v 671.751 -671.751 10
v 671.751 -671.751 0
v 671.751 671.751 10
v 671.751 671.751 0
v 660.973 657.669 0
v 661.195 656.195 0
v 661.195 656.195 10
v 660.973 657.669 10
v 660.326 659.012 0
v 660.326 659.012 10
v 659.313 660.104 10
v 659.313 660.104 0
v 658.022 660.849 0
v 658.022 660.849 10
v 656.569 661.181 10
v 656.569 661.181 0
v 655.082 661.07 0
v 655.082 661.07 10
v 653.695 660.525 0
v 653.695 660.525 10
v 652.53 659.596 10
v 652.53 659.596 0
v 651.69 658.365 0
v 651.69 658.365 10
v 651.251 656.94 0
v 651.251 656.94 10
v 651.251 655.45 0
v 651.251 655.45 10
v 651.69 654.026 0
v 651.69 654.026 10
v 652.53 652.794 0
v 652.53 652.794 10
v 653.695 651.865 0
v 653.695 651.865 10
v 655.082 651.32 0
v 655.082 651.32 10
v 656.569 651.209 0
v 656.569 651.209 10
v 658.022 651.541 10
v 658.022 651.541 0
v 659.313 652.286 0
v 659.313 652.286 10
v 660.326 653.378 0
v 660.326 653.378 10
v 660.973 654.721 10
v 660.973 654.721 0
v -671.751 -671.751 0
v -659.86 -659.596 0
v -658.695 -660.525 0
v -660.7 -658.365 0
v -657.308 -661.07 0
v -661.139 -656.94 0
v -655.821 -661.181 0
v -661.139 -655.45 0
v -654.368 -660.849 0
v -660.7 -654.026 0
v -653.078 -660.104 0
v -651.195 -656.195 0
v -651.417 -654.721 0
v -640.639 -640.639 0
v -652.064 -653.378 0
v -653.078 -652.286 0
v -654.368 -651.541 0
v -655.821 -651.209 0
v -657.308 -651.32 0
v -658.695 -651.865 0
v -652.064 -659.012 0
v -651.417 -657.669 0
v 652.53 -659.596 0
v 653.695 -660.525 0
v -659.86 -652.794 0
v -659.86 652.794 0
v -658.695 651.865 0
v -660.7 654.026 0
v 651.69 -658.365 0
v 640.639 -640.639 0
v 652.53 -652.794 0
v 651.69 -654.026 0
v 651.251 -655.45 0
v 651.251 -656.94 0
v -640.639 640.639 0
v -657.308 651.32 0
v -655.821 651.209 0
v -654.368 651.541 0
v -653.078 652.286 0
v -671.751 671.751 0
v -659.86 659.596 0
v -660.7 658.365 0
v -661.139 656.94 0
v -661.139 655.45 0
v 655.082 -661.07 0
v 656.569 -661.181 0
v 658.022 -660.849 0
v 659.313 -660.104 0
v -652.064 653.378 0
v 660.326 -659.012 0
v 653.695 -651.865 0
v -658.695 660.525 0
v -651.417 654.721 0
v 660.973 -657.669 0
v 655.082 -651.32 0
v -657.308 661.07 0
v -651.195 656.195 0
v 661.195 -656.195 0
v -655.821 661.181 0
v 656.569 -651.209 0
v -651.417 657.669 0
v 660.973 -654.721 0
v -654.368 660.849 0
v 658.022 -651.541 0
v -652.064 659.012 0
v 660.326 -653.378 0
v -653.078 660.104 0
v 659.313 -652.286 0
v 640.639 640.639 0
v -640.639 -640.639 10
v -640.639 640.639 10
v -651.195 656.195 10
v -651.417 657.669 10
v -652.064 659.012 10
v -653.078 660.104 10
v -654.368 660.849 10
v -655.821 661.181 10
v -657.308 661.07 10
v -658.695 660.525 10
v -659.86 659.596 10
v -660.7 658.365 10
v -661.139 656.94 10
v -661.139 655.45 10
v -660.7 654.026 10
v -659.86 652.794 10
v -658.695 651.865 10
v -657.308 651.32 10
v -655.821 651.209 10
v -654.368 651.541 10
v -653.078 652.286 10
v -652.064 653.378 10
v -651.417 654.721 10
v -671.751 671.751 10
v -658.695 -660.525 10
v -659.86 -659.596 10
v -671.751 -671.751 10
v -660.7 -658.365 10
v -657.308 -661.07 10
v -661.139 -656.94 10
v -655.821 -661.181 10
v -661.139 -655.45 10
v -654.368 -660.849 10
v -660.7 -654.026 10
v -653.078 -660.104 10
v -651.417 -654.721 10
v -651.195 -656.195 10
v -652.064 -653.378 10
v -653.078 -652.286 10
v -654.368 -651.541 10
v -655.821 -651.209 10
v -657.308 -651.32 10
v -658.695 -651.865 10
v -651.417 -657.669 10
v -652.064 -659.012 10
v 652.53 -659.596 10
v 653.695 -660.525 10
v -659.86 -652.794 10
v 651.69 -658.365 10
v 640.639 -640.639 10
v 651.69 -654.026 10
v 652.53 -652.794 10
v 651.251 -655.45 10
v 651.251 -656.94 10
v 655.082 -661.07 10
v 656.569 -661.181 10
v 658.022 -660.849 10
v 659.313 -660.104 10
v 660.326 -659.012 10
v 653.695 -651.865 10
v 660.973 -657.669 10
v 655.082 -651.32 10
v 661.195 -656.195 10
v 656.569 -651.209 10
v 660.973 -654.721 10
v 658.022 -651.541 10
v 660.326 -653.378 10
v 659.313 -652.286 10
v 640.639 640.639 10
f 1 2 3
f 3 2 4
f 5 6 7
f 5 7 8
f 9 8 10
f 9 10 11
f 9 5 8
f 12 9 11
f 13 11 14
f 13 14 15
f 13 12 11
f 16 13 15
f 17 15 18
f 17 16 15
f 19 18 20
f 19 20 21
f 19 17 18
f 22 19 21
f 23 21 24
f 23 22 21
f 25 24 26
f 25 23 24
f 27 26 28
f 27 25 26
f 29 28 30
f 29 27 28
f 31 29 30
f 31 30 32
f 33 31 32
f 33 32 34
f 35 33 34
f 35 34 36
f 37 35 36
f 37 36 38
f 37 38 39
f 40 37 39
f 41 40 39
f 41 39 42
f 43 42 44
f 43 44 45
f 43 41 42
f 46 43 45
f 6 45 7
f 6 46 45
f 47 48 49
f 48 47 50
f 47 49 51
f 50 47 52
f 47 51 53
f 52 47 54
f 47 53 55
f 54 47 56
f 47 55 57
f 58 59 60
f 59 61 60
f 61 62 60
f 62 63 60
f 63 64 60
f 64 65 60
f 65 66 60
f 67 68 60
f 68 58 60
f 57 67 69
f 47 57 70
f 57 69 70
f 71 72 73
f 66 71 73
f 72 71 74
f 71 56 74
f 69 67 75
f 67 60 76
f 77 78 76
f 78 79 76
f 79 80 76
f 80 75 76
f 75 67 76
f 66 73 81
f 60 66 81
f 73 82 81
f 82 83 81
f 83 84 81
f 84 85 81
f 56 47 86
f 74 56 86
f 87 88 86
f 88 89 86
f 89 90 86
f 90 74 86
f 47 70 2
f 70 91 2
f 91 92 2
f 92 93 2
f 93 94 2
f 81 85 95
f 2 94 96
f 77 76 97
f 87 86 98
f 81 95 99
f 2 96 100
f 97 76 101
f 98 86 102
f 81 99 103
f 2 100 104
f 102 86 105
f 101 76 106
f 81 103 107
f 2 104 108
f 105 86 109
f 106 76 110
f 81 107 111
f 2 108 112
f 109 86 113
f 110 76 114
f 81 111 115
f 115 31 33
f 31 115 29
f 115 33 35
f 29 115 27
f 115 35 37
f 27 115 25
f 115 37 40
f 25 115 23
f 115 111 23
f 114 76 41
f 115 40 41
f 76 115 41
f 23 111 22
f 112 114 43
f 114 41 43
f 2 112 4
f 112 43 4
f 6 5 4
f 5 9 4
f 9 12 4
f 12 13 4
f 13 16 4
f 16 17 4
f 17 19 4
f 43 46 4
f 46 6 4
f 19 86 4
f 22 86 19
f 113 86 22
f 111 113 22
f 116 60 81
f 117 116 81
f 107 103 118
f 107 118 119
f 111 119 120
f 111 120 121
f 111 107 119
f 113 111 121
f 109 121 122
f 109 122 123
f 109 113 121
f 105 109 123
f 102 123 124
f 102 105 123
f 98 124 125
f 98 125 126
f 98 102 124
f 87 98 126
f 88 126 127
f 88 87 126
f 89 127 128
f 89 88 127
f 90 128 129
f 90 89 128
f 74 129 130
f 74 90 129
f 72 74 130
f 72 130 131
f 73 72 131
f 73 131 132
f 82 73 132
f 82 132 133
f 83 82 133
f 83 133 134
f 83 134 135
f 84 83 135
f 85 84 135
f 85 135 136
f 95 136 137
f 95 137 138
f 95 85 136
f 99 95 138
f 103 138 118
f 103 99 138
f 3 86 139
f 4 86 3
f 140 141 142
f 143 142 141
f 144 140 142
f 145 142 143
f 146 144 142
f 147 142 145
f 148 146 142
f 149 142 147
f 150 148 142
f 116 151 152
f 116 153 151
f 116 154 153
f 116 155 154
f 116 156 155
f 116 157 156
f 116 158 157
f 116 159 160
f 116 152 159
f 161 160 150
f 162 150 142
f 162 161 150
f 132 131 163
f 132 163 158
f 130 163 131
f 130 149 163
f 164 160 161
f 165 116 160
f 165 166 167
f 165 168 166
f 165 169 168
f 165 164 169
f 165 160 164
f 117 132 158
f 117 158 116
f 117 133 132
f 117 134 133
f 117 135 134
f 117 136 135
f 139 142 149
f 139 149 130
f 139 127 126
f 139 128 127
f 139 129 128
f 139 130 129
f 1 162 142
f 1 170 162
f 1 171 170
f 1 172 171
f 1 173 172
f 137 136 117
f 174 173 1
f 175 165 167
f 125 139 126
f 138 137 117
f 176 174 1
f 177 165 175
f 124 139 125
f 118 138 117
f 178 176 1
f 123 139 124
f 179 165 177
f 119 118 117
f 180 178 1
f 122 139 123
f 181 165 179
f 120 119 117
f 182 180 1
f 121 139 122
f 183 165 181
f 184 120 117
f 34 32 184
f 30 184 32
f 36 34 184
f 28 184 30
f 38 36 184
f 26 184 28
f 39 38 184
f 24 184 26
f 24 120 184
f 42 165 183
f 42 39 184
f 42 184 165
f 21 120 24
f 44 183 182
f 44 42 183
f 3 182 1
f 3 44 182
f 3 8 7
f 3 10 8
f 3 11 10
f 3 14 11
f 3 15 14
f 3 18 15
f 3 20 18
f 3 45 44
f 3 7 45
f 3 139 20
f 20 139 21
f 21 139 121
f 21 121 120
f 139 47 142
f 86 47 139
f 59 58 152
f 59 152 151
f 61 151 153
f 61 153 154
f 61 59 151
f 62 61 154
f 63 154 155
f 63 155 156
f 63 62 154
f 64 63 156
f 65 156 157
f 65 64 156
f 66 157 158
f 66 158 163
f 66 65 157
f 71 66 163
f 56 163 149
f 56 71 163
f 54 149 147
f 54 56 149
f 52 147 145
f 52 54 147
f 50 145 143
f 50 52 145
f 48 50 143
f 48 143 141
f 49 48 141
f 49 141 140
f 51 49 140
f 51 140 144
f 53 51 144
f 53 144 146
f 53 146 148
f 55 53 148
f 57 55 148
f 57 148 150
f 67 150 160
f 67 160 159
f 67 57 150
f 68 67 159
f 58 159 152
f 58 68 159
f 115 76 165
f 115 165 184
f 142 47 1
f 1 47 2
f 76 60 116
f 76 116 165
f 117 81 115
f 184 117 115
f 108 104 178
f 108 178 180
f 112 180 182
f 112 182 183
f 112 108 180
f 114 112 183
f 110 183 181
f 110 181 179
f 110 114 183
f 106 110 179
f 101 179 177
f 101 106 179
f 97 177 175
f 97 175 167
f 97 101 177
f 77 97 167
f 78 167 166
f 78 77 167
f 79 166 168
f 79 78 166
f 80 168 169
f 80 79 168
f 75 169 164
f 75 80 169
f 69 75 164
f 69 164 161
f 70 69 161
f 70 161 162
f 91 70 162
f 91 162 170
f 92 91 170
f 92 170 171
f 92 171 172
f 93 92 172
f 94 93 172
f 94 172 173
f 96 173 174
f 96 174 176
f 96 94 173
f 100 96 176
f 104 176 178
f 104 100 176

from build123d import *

# Parameters (mm, degrees)
SKETCH1_W           = 1343.502884254
SKETCH1_H           = 1343.502884254
SKETCH1_R           = 5
SKETCH1_W_2         = 1281.27748751
SKETCH1_H_2         = 1281.27748751
BOSS_EXTRUDE1_DEPTH = 10


with BuildPart() as part:
    # Sketch1 → Boss-Extrude1 (new body)
    with BuildSketch(Plane.XY):
        Rectangle(SKETCH1_W, SKETCH1_H)
        with Locations((-656.195092941, 656.195092941)):
            Circle(SKETCH1_R, mode=Mode.SUBTRACT)
        with Locations((656.195092941, 656.195092941)):
            Circle(SKETCH1_R, mode=Mode.SUBTRACT)
        with Locations((656.195092941, -656.195092941)):
            Circle(SKETCH1_R, mode=Mode.SUBTRACT)
        with Locations((-656.195092941, -656.195092941)):
            Circle(SKETCH1_R, mode=Mode.SUBTRACT)
        Rectangle(SKETCH1_W_2, SKETCH1_H_2, mode=Mode.SUBTRACT)
    extrude(amount=BOSS_EXTRUDE1_DEPTH)


solid = part.part
